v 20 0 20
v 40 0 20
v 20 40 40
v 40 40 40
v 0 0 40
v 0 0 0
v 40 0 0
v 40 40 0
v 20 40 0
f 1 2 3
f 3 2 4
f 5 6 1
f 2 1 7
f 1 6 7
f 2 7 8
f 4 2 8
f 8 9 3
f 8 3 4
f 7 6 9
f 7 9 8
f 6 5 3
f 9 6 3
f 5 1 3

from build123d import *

# Parameters (mm, degrees)
SKETCH1_W           = 40
SKETCH1_H           = 40
BOSS_EXTRUDE1_DEPTH = 40
CUT_EXTRUDE1_DEPTH  = 40
CUT_EXTRUDE3_DEPTH  = 20
CUT_EXTRUDE4_DEPTH  = 20


with BuildPart() as part:
    # Sketch1 → Boss-Extrude1 (new body)
    with BuildSketch(Plane.XY):
        with Locations((20, 20)):
            Rectangle(SKETCH1_W, SKETCH1_H)
    extrude(amount=BOSS_EXTRUDE1_DEPTH)

    # Sketch2 → Cut-Extrude1 (cut)
    with BuildSketch(Plane.XY.offset(40)):
        Polygon((0, 0), (20, 40), (0, 40), align=None)
    extrude(amount=-CUT_EXTRUDE1_DEPTH, mode=Mode.SUBTRACT)

    # Sketch3 → Cut-Extrude3 (cut)
    with BuildSketch(Plane(origin=(40, 0, 0), x_dir=(0, 0, -1), z_dir=(1, 0, 0))):
        Polygon((-20, 0), (-40, 40), (-40, 0), align=None)
    extrude(amount=-CUT_EXTRUDE3_DEPTH, mode=Mode.SUBTRACT)

    # Sketch5 → Cut-Extrude4 (cut)
    with BuildSketch(Plane(origin=(17.777777778, -8.888888889, 17.777777778), x_dir=(0.745355992, 0.298142397, -0.596284794), z_dir=(0.666666667, -0.333333333, 0.666666667))):
        Polygon((2.98142397, 53.66563146), (2.98142397, 8.94427191), (-23.85139176, 17.88854382), align=None)
    extrude(amount=CUT_EXTRUDE4_DEPTH, mode=Mode.SUBTRACT)


solid = part.part
